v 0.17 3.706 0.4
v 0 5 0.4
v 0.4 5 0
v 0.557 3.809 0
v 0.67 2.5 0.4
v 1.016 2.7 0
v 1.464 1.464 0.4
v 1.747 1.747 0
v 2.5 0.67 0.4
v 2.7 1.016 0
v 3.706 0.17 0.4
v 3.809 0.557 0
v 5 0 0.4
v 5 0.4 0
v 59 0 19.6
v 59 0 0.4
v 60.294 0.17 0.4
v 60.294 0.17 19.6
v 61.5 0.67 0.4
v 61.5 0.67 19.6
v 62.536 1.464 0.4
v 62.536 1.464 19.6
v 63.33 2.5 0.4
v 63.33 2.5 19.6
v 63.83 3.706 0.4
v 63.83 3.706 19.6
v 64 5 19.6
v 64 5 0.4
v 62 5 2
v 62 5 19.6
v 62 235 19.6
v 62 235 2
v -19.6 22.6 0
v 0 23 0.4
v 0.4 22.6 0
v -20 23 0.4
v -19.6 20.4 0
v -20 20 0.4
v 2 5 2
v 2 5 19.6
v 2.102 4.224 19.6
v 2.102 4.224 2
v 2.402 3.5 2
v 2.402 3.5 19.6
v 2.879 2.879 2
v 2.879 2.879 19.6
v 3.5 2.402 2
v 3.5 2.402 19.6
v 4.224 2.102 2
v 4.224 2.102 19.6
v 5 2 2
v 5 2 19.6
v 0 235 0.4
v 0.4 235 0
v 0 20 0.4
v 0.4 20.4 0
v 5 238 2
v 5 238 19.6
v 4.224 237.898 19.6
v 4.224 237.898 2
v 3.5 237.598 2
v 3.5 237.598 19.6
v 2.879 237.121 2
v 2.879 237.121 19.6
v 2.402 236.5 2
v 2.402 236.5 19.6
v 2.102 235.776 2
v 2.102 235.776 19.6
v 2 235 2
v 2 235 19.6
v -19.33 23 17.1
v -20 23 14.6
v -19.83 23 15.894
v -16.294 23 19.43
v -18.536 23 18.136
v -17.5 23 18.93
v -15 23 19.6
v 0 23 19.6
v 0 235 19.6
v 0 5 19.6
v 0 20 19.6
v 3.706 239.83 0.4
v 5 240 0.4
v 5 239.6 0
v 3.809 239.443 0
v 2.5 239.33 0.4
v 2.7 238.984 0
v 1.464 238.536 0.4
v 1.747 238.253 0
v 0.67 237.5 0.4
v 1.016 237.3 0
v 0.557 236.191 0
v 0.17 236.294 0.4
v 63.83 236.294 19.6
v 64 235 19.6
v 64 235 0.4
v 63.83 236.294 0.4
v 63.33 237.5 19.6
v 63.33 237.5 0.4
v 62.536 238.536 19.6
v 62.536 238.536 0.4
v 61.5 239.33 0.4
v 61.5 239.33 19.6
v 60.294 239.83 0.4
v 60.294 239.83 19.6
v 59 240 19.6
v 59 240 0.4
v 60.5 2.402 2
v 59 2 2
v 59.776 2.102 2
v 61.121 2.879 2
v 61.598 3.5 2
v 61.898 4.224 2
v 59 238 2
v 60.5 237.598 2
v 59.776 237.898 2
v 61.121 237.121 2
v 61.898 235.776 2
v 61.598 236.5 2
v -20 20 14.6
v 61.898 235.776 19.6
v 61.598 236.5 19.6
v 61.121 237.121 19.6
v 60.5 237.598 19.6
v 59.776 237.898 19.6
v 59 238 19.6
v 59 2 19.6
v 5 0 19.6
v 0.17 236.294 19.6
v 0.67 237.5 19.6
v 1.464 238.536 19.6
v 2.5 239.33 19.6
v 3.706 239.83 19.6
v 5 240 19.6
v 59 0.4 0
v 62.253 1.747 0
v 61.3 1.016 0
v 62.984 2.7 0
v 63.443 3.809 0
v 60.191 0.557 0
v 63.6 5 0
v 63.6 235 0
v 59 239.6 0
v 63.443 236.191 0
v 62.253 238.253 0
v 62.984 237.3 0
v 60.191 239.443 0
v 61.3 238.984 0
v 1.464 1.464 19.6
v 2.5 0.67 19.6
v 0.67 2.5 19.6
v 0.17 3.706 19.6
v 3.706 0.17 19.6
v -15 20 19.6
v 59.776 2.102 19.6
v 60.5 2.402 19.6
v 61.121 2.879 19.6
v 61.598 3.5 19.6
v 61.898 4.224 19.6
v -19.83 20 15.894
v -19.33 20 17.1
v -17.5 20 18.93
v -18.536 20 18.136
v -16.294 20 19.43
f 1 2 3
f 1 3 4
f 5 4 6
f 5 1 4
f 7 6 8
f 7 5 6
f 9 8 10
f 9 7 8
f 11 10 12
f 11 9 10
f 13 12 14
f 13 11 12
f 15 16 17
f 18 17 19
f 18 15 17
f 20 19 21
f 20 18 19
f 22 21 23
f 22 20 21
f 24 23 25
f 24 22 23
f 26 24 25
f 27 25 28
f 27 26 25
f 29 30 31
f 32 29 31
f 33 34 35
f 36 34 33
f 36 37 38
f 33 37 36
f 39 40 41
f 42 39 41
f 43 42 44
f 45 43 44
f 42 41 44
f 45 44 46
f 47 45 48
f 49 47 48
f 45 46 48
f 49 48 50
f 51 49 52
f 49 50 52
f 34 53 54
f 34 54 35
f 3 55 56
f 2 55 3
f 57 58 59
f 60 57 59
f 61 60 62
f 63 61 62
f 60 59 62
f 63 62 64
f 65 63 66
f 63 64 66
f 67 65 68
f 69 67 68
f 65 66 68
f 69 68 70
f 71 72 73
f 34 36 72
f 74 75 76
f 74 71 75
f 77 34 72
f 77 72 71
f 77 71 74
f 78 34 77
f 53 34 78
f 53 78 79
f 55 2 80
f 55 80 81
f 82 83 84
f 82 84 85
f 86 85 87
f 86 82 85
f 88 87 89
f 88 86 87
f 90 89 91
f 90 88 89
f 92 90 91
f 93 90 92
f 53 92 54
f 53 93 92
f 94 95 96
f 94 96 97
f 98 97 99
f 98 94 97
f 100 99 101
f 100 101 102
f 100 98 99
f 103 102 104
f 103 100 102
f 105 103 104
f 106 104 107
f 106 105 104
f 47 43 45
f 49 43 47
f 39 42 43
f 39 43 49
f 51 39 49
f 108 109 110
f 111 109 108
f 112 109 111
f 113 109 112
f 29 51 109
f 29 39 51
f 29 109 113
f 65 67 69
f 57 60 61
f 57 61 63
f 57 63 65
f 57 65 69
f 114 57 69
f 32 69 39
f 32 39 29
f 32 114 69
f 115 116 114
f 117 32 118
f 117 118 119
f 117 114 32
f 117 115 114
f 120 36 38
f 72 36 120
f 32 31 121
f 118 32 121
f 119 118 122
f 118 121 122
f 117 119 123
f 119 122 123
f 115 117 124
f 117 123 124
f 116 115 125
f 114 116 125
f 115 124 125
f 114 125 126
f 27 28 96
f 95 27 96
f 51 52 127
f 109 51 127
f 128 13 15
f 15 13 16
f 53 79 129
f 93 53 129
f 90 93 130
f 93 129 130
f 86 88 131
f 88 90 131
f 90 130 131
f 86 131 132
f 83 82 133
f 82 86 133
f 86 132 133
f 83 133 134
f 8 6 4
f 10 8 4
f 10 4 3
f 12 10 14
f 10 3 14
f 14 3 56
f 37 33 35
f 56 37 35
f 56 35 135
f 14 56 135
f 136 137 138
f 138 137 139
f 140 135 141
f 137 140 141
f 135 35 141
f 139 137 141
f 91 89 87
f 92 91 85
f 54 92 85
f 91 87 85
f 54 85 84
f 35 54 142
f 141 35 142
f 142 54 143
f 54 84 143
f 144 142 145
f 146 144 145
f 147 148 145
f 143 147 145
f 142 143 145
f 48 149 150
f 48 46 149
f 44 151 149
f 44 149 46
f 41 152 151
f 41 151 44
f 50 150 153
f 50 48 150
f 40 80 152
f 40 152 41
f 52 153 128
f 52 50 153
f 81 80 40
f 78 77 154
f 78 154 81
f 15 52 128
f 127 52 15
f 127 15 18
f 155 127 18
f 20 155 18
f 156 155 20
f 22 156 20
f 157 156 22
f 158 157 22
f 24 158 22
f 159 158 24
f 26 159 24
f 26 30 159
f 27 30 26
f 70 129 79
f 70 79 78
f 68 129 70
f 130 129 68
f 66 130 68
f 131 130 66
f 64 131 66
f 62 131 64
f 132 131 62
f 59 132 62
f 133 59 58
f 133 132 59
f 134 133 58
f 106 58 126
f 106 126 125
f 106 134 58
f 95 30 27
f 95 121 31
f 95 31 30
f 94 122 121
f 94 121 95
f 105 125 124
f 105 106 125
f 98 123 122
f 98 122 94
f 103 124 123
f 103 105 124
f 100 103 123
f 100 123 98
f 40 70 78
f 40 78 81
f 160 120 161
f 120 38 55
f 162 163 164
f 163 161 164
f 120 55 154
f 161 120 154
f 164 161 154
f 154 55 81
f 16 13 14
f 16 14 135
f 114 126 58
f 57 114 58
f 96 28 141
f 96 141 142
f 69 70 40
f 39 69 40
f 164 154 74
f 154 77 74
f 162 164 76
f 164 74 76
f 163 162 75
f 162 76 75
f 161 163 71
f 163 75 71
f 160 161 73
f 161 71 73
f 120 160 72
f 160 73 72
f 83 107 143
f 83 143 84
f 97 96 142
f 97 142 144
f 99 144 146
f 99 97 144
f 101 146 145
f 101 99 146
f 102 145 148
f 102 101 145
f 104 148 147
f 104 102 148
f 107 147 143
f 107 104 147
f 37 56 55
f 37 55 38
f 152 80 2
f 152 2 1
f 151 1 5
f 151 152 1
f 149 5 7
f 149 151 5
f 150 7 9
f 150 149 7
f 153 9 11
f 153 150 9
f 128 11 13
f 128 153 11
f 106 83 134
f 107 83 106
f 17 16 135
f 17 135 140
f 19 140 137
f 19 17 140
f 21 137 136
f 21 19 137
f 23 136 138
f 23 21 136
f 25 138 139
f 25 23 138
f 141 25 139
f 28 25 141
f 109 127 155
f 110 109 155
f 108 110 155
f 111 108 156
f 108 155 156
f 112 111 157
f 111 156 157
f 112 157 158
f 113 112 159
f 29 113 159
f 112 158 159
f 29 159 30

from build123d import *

# Parameters (mm, degrees)
SKETCH1_W           = 64
SKETCH1_H           = 240
BOSS_EXTRUDE1_DEPTH = 19.6
FILLET1_R           = 5
CUT_EXTRUDE1_DEPTH  = 17.6
SKETCH4_W           = 19.6
SKETCH4_H           = 3
BOSS_EXTRUDE2_DEPTH = 20
FILLET2_R           = 5
CHAMFER1_SIZE       = 0.4


with BuildPart() as part:
    # Sketch1 → Boss-Extrude1 (new body)
    with BuildSketch(Plane.XY):
        with Locations((-118.769864545, 120.565422017)):
            Rectangle(SKETCH1_W, SKETCH1_H)
    extrude(amount=BOSS_EXTRUDE1_DEPTH)

    # Fillet1
    fillet1_edges = [part.edges().sort_by_distance(p)[0] for p in [
        (-86.769864545, 0.565422017, 9.8),
        (-150.769864545, 0.565422017, 9.8),
        (-150.769864545, 240.565422017, 9.8),
        (-86.769864545, 240.565422017, 9.8),
    ]]
    fillet(fillet1_edges, radius=FILLET1_R)

    # Sketch3 → Cut-Extrude1 (cut)
    with BuildSketch(Plane.XY.offset(19.6)):
        with BuildLine():
            Line((-148.769864545, 235.565422017), (-148.769864545, 5.565422017))
            ThreePointArc((-148.769864545, 5.565422017), (-147.891184888, 3.444101674), (-145.769864545, 2.565422017))
            Line((-145.769864545, 2.565422017), (-91.769864545, 2.565422017))
            ThreePointArc((-91.769864545, 2.565422017), (-89.648544201, 3.444101674), (-88.769864545, 5.565422017))
            Line((-88.769864545, 5.565422017), (-88.769864545, 235.565422017))
            ThreePointArc((-88.769864545, 235.565422017), (-89.648544201, 237.686742361), (-91.769864545, 238.565422017))
            Line((-91.769864545, 238.565422017), (-145.769864545, 238.565422017))
            ThreePointArc((-145.769864545, 238.565422017), (-147.891184888, 237.686742361), (-148.769864545, 235.565422017))
        make_face()
    extrude(amount=-CUT_EXTRUDE1_DEPTH, mode=Mode.SUBTRACT)

    # Sketch4 → Boss-Extrude2 (add)
    with BuildSketch(Plane.ZY.offset(150.769864545)):
        with Locations((9.8, 22.065422017)):
            Rectangle(SKETCH4_W, SKETCH4_H)
    extrude(amount=BOSS_EXTRUDE2_DEPTH)

    # Fillet2
    fillet2_edges = [part.edges().sort_by_distance(p)[0] for p in [
        (-170.769864545, 22.065422017, 19.6),
    ]]
    fillet(fillet2_edges, radius=FILLET2_R)


with BuildPart() as part_1:
    # Body-Move/Copy1: moved
    add(part.part.moved(Location((0, -0.56542, 0))))


with BuildPart() as part_2:
    # Body-Move/Copy2: moved
    add(part_1.part.moved(Location((150.76986, 0, 0))))

    # Chamfer1
    chamfer1_edges = [part_2.edges().sort_by_distance(p)[0] for p in [
        (31.999995455, 2.017e-06, 0),
        (63.999995455, 120.000002017, 0),
        (-4.545e-06, 129.000002017, 0),
        (31.999995455, 240.000002017, 0),
        (1.464461549, 238.535535923, 0),
        (62.535529361, 238.535535923, 0),
        (62.535529361, 1.464468112, 0),
        (1.464461549, 1.464468112, 0),
        (-4.545e-06, 12.500002017, 0),
        (-10.000004545, 23.000002017, 0),
        (-10.000004545, 20.000002017, 0),
        (-20.000004545, 21.500002017, 0),
    ]]
    chamfer(chamfer1_edges, length=CHAMFER1_SIZE)


solid = part_2.part
